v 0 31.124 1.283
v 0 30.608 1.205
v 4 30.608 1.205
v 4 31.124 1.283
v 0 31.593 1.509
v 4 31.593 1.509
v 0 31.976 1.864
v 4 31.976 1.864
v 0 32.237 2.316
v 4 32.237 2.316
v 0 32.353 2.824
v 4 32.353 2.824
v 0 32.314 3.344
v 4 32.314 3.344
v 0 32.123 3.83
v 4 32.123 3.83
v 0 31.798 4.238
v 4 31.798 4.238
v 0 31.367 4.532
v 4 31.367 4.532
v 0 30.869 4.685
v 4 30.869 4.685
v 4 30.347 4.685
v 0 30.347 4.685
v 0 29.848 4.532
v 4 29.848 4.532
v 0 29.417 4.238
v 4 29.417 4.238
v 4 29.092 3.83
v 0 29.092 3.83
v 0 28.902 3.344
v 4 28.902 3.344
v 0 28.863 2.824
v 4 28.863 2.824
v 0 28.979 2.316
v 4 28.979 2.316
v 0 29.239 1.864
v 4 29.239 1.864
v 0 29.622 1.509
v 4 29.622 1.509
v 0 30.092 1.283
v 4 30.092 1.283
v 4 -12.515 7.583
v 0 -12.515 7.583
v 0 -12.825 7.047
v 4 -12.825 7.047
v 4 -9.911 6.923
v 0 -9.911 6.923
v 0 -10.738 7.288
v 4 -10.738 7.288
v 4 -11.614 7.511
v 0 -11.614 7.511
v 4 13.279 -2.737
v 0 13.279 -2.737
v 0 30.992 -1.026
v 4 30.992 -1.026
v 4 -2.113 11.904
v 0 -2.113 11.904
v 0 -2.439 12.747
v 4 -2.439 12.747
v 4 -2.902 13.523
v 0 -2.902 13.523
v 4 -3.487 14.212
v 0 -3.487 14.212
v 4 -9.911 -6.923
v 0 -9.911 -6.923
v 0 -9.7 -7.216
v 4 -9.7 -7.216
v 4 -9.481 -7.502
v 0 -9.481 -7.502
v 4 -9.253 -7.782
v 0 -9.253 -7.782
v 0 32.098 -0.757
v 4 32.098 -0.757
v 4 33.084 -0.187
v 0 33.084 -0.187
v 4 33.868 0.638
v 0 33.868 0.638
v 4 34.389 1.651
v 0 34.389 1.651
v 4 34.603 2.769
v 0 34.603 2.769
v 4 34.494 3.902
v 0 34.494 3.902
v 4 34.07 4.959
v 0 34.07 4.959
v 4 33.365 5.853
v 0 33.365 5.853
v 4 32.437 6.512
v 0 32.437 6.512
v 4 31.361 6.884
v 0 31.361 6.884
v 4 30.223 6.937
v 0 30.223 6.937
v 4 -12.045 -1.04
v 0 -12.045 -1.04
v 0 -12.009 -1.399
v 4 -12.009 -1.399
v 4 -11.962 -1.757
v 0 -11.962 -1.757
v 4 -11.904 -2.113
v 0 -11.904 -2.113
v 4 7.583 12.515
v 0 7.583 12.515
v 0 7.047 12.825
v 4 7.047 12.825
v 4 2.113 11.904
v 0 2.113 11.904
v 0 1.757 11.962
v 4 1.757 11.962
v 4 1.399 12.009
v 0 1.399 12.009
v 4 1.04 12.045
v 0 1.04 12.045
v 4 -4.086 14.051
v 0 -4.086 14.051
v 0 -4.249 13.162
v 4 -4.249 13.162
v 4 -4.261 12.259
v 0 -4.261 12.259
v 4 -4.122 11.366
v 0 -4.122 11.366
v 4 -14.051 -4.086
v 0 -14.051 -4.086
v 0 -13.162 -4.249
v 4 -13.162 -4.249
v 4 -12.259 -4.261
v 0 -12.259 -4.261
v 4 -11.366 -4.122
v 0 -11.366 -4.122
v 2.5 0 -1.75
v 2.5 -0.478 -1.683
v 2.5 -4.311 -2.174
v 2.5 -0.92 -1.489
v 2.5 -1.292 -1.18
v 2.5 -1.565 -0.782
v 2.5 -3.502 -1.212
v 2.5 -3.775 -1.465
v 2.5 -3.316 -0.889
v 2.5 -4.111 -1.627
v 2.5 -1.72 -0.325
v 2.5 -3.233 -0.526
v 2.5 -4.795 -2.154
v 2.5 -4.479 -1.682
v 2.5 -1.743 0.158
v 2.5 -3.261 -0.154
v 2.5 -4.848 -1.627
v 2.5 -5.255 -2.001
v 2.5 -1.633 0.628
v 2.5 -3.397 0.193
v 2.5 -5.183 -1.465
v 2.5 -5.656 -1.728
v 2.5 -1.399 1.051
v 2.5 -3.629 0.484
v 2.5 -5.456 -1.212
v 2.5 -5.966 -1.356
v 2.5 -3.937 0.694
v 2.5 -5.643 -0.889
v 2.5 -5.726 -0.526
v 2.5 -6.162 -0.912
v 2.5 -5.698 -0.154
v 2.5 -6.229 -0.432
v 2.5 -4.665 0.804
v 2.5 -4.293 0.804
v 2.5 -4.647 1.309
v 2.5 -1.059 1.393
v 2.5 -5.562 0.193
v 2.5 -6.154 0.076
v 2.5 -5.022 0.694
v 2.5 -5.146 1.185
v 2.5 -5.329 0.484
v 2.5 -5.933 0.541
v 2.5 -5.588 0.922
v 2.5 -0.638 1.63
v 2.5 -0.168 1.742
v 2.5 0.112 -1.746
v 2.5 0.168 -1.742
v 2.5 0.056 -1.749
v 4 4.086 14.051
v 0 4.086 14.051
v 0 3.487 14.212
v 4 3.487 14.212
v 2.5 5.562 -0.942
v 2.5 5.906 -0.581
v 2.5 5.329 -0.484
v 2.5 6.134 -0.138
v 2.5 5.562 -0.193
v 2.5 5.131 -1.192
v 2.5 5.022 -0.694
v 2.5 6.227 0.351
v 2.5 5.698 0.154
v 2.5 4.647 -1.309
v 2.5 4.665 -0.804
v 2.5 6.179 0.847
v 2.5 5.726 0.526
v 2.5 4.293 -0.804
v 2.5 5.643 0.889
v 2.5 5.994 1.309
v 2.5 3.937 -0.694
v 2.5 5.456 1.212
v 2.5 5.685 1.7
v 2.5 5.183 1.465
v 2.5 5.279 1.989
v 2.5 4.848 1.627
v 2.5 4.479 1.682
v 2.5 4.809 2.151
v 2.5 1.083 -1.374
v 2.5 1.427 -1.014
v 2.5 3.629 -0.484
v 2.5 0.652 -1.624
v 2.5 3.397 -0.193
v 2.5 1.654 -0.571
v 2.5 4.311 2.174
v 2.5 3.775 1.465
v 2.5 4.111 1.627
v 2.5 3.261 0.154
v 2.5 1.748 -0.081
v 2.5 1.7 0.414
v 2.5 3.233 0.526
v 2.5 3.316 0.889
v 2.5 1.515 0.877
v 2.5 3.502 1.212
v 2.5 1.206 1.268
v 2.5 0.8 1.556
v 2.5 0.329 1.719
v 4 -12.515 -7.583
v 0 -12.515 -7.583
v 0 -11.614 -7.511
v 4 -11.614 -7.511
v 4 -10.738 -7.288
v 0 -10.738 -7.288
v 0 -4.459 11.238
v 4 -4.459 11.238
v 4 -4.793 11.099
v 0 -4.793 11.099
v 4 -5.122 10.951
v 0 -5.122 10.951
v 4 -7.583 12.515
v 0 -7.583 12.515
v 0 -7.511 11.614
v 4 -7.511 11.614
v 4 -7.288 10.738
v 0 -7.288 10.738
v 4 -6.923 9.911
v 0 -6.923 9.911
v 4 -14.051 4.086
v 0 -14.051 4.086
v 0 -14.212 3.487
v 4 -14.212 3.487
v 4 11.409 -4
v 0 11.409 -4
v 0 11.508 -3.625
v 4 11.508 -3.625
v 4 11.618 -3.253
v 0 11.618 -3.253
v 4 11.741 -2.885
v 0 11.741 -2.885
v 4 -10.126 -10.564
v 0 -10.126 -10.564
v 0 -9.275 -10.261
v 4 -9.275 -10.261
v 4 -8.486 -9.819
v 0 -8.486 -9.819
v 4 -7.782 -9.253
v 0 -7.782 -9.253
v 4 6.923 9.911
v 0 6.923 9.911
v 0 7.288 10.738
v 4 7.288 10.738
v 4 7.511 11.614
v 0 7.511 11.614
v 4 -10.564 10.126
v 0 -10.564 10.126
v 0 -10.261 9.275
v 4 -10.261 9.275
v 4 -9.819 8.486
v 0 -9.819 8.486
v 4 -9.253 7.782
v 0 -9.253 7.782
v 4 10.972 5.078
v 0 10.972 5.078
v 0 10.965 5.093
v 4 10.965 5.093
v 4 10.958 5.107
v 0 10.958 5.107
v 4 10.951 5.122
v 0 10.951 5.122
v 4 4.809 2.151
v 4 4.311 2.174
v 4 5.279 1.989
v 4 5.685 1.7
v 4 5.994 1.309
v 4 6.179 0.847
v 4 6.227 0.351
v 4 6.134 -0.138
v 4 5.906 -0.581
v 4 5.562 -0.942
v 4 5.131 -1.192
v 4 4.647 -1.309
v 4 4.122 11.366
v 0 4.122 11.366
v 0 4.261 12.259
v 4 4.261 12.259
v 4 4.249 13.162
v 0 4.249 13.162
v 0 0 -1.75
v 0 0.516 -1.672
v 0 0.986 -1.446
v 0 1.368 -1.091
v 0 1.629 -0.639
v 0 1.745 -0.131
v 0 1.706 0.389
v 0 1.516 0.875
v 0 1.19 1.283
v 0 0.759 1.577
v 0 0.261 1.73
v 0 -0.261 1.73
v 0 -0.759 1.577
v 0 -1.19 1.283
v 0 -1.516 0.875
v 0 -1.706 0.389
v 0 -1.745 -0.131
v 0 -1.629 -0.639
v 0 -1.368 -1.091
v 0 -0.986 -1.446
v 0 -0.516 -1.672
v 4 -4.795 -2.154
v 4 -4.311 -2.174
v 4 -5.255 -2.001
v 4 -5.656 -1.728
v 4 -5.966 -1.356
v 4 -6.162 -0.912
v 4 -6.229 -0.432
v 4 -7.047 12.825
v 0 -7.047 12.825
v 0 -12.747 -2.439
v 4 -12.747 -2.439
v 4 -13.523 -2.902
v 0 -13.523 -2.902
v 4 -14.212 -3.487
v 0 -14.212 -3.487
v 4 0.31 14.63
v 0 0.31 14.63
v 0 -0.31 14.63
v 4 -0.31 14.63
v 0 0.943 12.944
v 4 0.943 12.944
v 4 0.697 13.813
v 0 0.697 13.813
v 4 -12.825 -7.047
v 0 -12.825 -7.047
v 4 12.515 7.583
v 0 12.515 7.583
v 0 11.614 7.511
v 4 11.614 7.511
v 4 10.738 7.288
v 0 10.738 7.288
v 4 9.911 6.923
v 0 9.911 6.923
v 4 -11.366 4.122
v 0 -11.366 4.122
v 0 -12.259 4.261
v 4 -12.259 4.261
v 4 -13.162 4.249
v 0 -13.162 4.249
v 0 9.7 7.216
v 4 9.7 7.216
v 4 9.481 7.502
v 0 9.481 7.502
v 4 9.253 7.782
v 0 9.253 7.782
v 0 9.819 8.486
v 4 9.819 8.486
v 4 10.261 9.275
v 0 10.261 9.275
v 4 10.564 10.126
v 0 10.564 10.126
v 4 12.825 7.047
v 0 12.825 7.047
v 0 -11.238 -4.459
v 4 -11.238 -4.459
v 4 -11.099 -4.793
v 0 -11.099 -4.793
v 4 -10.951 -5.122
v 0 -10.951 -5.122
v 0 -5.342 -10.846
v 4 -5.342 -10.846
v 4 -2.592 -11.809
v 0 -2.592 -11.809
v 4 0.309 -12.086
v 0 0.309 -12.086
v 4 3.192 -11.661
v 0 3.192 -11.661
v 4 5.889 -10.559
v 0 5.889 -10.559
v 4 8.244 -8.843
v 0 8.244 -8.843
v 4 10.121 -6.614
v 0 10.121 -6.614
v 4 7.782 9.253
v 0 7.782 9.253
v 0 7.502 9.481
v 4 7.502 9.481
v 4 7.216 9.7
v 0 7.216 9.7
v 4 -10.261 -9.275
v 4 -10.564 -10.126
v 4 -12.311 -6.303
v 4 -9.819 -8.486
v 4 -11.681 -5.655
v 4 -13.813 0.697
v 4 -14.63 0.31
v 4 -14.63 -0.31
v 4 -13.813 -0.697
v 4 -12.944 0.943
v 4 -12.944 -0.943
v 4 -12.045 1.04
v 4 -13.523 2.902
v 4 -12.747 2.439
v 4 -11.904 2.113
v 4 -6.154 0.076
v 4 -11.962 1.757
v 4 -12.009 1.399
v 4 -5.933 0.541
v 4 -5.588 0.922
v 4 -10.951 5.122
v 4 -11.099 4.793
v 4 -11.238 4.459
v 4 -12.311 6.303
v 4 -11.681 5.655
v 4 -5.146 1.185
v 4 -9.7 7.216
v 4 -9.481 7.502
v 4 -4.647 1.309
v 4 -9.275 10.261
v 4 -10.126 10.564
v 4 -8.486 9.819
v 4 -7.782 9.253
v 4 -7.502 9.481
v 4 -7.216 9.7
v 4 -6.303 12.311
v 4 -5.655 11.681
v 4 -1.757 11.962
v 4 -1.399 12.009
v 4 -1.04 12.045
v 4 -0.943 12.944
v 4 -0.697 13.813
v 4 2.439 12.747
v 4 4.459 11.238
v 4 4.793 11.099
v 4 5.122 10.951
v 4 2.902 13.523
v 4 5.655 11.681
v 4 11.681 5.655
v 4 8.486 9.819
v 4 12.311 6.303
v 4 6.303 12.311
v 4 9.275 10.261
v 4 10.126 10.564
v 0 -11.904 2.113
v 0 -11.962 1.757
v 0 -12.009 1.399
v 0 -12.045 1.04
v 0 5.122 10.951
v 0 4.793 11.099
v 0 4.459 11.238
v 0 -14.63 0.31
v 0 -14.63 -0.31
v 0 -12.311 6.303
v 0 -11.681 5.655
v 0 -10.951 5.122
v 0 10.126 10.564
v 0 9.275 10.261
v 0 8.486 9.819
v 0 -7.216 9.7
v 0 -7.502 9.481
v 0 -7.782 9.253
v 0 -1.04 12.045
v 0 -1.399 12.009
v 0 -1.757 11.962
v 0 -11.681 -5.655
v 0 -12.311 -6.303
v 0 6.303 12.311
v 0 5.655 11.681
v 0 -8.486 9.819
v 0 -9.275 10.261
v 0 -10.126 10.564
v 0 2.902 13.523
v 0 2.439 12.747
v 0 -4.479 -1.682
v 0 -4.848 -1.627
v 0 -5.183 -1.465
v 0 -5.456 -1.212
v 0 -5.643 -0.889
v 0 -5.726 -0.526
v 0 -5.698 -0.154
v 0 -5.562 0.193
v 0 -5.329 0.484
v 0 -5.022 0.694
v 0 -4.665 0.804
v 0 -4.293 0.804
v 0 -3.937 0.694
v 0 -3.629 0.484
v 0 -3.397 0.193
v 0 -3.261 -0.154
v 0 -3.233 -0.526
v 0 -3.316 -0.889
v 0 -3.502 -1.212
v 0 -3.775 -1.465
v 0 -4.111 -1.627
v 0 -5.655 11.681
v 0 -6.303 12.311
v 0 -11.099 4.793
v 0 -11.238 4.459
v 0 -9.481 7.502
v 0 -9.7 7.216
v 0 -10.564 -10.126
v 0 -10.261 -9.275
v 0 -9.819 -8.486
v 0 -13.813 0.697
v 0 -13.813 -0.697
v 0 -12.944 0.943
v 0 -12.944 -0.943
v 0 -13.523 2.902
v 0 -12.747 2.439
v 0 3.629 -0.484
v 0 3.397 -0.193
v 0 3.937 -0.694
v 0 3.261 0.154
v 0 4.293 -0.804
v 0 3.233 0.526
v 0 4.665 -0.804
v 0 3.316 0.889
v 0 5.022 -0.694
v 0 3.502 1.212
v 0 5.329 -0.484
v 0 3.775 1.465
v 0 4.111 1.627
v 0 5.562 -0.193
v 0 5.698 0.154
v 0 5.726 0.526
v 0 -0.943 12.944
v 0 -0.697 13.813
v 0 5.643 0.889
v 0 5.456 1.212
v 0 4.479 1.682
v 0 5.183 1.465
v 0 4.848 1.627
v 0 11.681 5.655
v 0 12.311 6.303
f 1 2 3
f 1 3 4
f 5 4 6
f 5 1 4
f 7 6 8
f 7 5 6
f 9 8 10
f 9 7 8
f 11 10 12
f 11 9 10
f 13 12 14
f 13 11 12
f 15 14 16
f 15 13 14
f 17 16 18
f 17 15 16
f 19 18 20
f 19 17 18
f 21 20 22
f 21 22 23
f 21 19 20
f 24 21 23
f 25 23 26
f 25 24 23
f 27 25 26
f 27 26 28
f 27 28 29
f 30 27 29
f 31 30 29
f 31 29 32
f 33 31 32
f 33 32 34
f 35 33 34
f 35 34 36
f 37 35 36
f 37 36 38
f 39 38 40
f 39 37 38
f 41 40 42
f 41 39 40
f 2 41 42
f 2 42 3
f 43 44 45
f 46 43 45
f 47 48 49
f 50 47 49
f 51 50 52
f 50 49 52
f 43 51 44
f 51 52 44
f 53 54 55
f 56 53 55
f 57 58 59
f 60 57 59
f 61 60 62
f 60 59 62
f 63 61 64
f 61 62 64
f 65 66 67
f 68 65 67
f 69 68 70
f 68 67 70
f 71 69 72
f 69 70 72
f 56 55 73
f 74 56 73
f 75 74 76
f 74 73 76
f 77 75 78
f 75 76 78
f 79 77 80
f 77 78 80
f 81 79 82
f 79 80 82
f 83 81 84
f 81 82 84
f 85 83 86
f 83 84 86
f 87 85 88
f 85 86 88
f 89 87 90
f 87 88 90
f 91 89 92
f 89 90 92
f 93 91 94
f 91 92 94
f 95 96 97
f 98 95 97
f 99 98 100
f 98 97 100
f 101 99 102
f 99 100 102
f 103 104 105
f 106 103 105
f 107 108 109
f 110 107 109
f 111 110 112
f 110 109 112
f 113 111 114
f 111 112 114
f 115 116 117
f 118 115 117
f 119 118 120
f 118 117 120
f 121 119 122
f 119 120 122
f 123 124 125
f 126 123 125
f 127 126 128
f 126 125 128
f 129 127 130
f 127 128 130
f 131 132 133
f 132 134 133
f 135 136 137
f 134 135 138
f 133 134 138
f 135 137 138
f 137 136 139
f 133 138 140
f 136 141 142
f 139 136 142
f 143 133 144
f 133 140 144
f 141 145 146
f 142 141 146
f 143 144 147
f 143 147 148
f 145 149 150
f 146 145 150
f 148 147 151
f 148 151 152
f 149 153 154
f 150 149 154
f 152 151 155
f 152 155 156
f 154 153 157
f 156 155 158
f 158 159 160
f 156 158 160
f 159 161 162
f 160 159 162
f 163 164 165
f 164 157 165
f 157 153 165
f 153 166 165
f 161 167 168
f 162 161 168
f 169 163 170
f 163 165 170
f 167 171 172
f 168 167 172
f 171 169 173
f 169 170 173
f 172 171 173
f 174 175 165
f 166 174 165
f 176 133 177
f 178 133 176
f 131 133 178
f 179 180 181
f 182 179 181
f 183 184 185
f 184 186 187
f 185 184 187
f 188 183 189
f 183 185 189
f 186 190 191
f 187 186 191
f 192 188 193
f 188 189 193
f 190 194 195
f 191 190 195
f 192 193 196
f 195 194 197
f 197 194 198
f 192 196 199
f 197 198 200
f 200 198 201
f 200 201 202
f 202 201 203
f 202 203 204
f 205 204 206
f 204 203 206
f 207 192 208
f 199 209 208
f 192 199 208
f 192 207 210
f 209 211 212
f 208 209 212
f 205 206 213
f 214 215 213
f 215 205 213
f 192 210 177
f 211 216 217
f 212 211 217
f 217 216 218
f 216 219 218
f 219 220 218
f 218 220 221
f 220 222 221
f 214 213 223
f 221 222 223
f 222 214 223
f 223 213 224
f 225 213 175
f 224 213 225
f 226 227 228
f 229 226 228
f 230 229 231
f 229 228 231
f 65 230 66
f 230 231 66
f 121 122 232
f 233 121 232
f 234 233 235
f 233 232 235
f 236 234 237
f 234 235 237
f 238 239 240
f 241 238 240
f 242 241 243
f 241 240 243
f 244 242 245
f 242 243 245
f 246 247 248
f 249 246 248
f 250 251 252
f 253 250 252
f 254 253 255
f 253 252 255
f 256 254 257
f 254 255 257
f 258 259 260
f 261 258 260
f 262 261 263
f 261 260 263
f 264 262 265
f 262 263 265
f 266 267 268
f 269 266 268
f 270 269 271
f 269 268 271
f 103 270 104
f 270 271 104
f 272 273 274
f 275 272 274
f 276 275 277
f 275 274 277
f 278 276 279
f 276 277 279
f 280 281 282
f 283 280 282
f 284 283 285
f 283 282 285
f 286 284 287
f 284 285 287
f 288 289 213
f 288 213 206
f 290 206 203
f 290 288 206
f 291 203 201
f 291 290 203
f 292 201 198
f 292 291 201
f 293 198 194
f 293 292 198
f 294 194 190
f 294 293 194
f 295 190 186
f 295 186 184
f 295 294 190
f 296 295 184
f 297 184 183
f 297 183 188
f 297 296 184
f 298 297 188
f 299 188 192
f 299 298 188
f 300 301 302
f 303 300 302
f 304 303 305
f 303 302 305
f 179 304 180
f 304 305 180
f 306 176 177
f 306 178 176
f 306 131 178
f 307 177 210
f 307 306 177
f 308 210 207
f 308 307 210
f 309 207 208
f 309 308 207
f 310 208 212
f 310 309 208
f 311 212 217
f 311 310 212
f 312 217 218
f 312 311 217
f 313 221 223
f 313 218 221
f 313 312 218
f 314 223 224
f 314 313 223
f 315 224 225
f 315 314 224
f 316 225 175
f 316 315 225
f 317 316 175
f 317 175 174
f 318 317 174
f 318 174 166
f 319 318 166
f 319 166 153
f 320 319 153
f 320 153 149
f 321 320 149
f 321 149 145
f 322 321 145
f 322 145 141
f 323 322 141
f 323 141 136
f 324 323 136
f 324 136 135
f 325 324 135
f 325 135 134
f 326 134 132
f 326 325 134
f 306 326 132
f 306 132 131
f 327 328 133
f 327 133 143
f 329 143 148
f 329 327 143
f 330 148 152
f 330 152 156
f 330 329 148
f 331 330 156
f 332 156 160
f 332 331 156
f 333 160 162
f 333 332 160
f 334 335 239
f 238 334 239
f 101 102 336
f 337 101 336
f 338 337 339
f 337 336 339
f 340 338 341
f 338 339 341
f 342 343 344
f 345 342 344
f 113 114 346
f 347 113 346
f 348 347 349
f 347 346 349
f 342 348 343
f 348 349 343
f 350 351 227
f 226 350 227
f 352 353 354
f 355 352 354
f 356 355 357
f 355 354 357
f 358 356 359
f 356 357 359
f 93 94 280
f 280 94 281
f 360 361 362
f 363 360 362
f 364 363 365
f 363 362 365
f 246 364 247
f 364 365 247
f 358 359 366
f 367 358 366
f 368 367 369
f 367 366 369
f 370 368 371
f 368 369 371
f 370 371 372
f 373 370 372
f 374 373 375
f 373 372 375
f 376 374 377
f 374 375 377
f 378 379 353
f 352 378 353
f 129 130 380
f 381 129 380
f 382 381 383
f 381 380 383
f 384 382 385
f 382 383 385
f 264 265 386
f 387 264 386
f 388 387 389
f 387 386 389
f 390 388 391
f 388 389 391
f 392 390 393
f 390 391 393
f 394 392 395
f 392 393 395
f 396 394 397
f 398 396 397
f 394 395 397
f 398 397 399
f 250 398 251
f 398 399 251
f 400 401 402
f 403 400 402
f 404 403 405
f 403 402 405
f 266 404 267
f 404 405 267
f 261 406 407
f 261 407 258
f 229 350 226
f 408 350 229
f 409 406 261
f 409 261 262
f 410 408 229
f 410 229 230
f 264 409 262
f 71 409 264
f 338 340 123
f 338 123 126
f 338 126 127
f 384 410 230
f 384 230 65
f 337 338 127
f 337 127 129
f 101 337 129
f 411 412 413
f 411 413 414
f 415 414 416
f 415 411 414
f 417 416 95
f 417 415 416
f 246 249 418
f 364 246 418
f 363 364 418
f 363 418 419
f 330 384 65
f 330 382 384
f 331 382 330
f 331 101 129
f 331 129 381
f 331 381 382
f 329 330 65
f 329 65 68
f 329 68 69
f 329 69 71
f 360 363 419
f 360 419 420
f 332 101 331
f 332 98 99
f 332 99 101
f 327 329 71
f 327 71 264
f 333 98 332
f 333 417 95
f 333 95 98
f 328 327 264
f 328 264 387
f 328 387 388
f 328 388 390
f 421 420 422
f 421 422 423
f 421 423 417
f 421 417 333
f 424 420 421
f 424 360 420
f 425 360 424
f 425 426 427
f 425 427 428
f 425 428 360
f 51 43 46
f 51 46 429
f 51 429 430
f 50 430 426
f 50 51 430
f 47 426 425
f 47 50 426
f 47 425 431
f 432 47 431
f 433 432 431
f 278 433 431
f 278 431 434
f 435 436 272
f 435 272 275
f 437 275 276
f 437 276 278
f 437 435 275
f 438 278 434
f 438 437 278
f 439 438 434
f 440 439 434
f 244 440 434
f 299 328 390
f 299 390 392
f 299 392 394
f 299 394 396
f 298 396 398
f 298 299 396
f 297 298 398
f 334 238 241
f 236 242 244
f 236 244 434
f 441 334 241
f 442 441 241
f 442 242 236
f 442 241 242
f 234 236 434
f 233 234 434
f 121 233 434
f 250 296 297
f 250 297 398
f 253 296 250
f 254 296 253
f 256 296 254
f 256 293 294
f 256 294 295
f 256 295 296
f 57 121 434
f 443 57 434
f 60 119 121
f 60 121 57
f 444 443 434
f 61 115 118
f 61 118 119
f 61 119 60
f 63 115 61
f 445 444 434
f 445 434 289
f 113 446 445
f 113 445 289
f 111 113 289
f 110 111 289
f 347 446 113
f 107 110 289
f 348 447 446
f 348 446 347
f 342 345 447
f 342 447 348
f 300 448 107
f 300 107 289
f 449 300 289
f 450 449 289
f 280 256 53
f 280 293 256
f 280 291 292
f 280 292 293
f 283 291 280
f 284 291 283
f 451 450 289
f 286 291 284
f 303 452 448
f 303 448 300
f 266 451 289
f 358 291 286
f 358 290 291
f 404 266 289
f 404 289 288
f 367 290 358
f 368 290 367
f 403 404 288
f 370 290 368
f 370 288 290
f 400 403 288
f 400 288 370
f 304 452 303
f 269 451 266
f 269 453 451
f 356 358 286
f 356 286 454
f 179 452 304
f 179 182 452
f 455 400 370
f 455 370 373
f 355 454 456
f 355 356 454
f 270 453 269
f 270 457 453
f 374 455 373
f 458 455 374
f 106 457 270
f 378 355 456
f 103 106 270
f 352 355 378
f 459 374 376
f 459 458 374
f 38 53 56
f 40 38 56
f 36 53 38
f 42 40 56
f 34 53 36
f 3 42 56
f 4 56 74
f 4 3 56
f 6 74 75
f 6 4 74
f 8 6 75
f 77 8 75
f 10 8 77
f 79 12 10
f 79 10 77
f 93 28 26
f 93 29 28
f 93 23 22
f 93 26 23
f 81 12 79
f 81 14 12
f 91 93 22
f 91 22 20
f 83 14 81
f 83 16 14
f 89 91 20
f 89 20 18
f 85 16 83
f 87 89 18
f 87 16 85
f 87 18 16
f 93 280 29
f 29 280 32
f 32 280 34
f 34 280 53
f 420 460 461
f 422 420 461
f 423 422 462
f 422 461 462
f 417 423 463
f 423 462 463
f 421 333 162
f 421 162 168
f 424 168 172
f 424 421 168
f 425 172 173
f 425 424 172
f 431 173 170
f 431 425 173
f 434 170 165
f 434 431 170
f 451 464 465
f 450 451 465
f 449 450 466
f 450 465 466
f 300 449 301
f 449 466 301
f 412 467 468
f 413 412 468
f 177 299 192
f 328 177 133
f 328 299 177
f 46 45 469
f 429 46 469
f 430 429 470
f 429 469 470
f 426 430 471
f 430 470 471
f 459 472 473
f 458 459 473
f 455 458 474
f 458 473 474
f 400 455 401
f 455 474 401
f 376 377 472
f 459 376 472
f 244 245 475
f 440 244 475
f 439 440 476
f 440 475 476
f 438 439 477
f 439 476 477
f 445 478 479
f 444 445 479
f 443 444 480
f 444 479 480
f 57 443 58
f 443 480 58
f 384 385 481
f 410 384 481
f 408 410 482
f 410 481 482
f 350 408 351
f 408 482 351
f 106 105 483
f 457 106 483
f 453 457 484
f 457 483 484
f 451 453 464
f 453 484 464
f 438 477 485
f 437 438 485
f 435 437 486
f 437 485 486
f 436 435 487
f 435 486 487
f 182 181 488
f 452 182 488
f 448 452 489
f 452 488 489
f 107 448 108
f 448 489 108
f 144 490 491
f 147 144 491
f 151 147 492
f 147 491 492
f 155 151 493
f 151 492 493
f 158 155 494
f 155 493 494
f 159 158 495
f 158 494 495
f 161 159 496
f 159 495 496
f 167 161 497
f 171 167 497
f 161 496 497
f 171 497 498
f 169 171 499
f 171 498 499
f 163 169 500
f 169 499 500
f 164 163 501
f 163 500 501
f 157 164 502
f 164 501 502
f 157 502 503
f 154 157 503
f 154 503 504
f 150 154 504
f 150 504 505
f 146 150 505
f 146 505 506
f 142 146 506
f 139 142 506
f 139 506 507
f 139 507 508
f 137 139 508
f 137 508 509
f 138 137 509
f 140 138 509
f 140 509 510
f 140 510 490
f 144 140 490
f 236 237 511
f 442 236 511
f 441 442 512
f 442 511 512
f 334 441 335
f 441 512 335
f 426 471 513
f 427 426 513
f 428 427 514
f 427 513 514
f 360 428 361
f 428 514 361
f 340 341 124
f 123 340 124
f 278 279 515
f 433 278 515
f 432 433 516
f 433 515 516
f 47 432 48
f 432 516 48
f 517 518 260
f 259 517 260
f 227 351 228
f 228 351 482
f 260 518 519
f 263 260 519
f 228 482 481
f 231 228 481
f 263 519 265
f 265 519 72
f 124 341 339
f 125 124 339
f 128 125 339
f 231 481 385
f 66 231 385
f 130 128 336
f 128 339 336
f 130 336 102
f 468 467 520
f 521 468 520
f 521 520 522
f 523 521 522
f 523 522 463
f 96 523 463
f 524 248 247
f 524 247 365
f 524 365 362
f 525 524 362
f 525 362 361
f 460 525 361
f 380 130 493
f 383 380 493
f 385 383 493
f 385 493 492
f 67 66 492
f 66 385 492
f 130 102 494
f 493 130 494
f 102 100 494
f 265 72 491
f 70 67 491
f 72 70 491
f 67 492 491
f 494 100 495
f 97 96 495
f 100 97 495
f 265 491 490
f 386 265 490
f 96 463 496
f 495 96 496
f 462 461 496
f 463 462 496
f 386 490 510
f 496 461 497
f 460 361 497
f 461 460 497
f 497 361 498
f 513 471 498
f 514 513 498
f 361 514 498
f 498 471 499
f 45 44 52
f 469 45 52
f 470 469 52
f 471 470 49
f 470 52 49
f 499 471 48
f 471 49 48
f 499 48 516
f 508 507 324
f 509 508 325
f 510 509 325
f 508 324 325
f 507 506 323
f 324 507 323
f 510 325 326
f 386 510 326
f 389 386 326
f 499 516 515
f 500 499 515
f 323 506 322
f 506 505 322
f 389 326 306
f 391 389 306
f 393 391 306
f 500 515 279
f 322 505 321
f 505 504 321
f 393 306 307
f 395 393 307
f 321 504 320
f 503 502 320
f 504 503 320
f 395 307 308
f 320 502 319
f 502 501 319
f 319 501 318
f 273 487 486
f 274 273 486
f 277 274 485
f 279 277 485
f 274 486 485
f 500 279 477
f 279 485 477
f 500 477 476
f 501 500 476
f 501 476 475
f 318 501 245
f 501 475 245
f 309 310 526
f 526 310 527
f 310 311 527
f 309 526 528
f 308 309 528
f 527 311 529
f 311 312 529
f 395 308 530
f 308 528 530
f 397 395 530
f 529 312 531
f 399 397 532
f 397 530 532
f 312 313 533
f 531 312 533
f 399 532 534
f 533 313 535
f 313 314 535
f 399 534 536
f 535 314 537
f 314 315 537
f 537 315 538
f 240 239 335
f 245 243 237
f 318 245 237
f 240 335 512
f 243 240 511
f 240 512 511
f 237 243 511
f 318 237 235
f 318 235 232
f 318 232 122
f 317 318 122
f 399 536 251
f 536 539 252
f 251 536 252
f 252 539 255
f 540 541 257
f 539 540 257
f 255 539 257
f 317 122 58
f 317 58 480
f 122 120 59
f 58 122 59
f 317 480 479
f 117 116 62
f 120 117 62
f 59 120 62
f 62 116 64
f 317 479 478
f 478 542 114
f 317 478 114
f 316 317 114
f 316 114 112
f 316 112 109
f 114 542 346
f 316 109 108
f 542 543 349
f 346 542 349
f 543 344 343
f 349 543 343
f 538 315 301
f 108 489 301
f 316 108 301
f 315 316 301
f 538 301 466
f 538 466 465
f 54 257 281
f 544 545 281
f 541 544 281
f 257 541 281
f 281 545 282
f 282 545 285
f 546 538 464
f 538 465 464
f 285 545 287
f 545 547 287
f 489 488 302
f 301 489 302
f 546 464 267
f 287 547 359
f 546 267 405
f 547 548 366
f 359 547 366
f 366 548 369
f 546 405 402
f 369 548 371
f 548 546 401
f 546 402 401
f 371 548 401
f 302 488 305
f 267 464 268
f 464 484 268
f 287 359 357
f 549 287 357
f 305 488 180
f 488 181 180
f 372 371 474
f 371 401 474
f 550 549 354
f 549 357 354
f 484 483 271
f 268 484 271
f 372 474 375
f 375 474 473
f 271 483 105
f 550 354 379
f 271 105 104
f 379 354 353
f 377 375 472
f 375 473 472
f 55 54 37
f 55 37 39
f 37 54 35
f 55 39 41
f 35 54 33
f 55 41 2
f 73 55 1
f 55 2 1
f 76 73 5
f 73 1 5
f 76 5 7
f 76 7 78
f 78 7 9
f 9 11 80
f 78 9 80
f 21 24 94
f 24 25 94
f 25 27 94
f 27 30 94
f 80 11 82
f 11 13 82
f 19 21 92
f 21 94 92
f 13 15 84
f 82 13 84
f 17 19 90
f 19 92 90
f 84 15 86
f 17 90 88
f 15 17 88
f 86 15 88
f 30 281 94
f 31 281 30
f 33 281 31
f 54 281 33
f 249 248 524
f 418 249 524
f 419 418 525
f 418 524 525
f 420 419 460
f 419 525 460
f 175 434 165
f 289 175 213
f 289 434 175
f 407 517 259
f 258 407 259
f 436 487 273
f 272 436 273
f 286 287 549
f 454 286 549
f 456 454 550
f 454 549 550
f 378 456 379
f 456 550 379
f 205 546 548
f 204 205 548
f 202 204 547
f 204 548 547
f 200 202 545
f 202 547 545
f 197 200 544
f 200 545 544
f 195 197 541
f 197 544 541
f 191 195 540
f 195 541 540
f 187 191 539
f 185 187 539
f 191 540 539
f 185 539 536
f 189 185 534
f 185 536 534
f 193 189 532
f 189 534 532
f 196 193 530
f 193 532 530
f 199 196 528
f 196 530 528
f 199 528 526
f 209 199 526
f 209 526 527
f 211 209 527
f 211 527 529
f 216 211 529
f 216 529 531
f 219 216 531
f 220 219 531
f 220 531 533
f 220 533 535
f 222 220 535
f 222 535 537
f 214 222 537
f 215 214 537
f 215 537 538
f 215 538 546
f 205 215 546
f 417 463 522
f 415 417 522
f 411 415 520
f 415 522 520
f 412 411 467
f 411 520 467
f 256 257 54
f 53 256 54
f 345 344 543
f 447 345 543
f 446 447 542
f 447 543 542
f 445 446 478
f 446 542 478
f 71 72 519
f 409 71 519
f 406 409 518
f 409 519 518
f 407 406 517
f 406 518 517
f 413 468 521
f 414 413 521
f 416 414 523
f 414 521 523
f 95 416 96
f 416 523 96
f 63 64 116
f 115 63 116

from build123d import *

# Parameters (mm, degrees)
SKETCH1_R           = 1.75
BOSS_EXTRUDE1_DEPTH = 4
SKETCH3_R           = 1.25
CUT_EXTRUDE1_DEPTH  = 38.785297658
CUT_EXTRUDE2_START  = -4
CUT_EXTRUDE2_DEPTH  = 1.5


with BuildPart() as part:
    # Sketch1 → Boss-Extrude1 (new body)
    with BuildSketch(Plane.YZ):
        with BuildLine():
            Line((0.31, 14.63), (-0.31, 14.63))
            ThreePointArc((-0.31, 14.63), (-0.838273314, 13.383704325), (-1.04, 12.04518576))
            ThreePointArc((-1.04, 12.04518576), (-1.578061664, 11.986568374), (-2.112960617, 11.903927815))
            ThreePointArc((-2.112960617, 11.903927815), (-2.65424773, 13.144626757), (-3.487085624, 14.211728743))
            Line((-3.487085624, 14.211728743), (-4.085959636, 14.051260935))
            ThreePointArc((-4.085959636, 14.051260935), (-4.273667417, 12.71070456), (-4.122086336, 11.365584201))
            ThreePointArc((-4.122086336, 11.365584201), (-4.626642697, 11.169703548), (-5.12192646, 10.951436862))
            ThreePointArc((-5.12192646, 10.951436862), (-5.965886177, 12.009764599), (-7.046532125, 12.824951657))
            Line((-7.046532125, 12.824951657), (-7.583467875, 12.514951657))
            ThreePointArc((-7.583467875, 12.514951657), (-7.417818147, 11.171491285), (-6.9232593, 9.911436862))
            ThreePointArc((-6.9232593, 9.911436862), (-7.359925677, 9.591641884), (-7.781841479, 9.252623584))
            ThreePointArc((-7.781841479, 9.252623584), (-8.870959341, 10.05645683), (-10.125769107, 10.564175311))
            Line((-10.125769107, 10.564175311), (-10.564175311, 10.125769107))
            ThreePointArc((-10.564175311, 10.125769107), (-10.05645683, 8.870959341), (-9.252623584, 7.781841479))
            ThreePointArc((-9.252623584, 7.781841479), (-9.591641884, 7.359925677), (-9.911436862, 6.9232593))
            ThreePointArc((-9.911436862, 6.9232593), (-11.171491285, 7.417818147), (-12.514951657, 7.583467875))
            Line((-12.514951657, 7.583467875), (-12.824951657, 7.046532125))
            ThreePointArc((-12.824951657, 7.046532125), (-12.009764599, 5.965886177), (-10.951436862, 5.12192646))
            ThreePointArc((-10.951436862, 5.12192646), (-11.169703548, 4.626642697), (-11.365584201, 4.122086336))
            ThreePointArc((-11.365584201, 4.122086336), (-12.71070456, 4.273667417), (-14.051260935, 4.085959636))
            Line((-14.051260935, 4.085959636), (-14.211728743, 3.487085624))
            ThreePointArc((-14.211728743, 3.487085624), (-13.144626757, 2.65424773), (-11.903927815, 2.112960617))
            ThreePointArc((-11.903927815, 2.112960617), (-11.986568374, 1.578061664), (-12.04518576, 1.04))
            ThreePointArc((-12.04518576, 1.04), (-13.383704325, 0.838273314), (-14.63, 0.31))
            Line((-14.63, 0.31), (-14.63, -0.31))
            ThreePointArc((-14.63, -0.31), (-13.383704325, -0.838273314), (-12.04518576, -1.04))
            ThreePointArc((-12.04518576, -1.04), (-11.986568374, -1.578061664), (-11.903927815, -2.112960617))
            ThreePointArc((-11.903927815, -2.112960617), (-13.144626757, -2.65424773), (-14.211728743, -3.487085624))
            Line((-14.211728743, -3.487085624), (-14.051260935, -4.085959636))
            ThreePointArc((-14.051260935, -4.085959636), (-12.71070456, -4.273667417), (-11.365584201, -4.122086336))
            ThreePointArc((-11.365584201, -4.122086336), (-11.169703548, -4.626642697), (-10.951436862, -5.12192646))
            ThreePointArc((-10.951436862, -5.12192646), (-12.009764599, -5.965886177), (-12.824951657, -7.046532125))
            Line((-12.824951657, -7.046532125), (-12.514951657, -7.583467875))
            ThreePointArc((-12.514951657, -7.583467875), (-11.171491285, -7.417818147), (-9.911436862, -6.9232593))
            ThreePointArc((-9.911436862, -6.9232593), (-9.591641884, -7.359925677), (-9.252623584, -7.781841479))
            ThreePointArc((-9.252623584, -7.781841479), (-10.05645683, -8.870959341), (-10.564175311, -10.125769107))
            Line((-10.564175311, -10.125769107), (-10.125769107, -10.564175311))
            ThreePointArc((-10.125769107, -10.564175311), (-8.870959341, -10.05645683), (-7.781841479, -9.252623584))
            ThreePointArc((-7.781841479, -9.252623584), (3.191677838, -11.661101688), (11.409123542, -4))
            ThreePointArc((11.409123542, -4), (11.561502637, -3.438555035), (11.740713538, -2.885090229))
            Line((11.740713538, -2.885090229), (13.278503475, -2.736624135))
            Line((13.278503475, -2.736624135), (30.992077522, -1.026465229))
            ThreePointArc((30.992077522, -1.026465229), (34.589171795, 3.3394153), (30.223291266, 6.936509573))
            Line((30.223291266, 6.936509573), (10.971927281, 5.077884573))
            ThreePointArc((10.971927281, 5.077884573), (10.96170419, 5.099915807), (10.951436862, 5.12192646))
            ThreePointArc((10.951436862, 5.12192646), (12.009764599, 5.965886177), (12.824951657, 7.046532125))
            Line((12.824951657, 7.046532125), (12.514951657, 7.583467875))
            ThreePointArc((12.514951657, 7.583467875), (11.171491285, 7.417818147), (9.911436862, 6.9232593))
            ThreePointArc((9.911436862, 6.9232593), (9.591641884, 7.359925677), (9.252623584, 7.781841479))
            ThreePointArc((9.252623584, 7.781841479), (10.05645683, 8.870959341), (10.564175311, 10.125769107))
            Line((10.564175311, 10.125769107), (10.125769107, 10.564175311))
            ThreePointArc((10.125769107, 10.564175311), (8.870959341, 10.05645683), (7.781841479, 9.252623584))
            ThreePointArc((7.781841479, 9.252623584), (7.359925677, 9.591641884), (6.9232593, 9.911436862))
            ThreePointArc((6.9232593, 9.911436862), (7.417818147, 11.171491285), (7.583467875, 12.514951657))
            Line((7.583467875, 12.514951657), (7.046532125, 12.824951657))
            ThreePointArc((7.046532125, 12.824951657), (5.965886177, 12.009764599), (5.12192646, 10.951436862))
            ThreePointArc((5.12192646, 10.951436862), (4.626642697, 11.169703548), (4.122086336, 11.365584201))
            ThreePointArc((4.122086336, 11.365584201), (4.273667417, 12.71070456), (4.085959636, 14.051260935))
            Line((4.085959636, 14.051260935), (3.487085624, 14.211728743))
            ThreePointArc((3.487085624, 14.211728743), (2.65424773, 13.144626757), (2.112960617, 11.903927815))
            ThreePointArc((2.112960617, 11.903927815), (1.578061664, 11.986568374), (1.04, 12.04518576))
            ThreePointArc((1.04, 12.04518576), (0.838273314, 13.383704325), (0.31, 14.63))
        make_face()
        with Locations(Location((0, 0, 0), (0, 0, 270))):
            Circle(SKETCH1_R, mode=Mode.SUBTRACT)
        with Locations(Location((30.607684394, 2.955022172, 0), (0, 0, 270))):
            Circle(SKETCH1_R, mode=Mode.SUBTRACT)
    extrude(amount=BOSS_EXTRUDE1_DEPTH)

    # Sketch3 → Cut-Extrude1 (cut, through all)
    with BuildSketch(Plane(origin=(0, 0, 0), x_dir=(0, -1, 0), z_dir=(-1, 0, 0))):
        with Locations(Location((-4.479173326, 0.432442269, 0), (0, 0, 90))):
            Circle(SKETCH3_R)
        with Locations(Location((4.479173326, -0.432442269, 0), (0, 0, 270))):
            Circle(SKETCH3_R)
    extrude(amount=-CUT_EXTRUDE1_DEPTH, mode=Mode.SUBTRACT)

    # Sketch4 → Cut-Extrude2 (cut)
    with BuildSketch(Plane(origin=(0, 0, 0), x_dir=(0, -1, 0), z_dir=(-1, 0, 0)).offset(CUT_EXTRUDE2_START)):
        with BuildLine():
            ThreePointArc((6.229173326, -0.432442269), (5.774704296, 0.744035315), (4.647345319, 1.309458469))
            Line((4.647345319, 1.309458469), (4.311001332, -2.174343007))
            ThreePointArc((4.311001332, -2.174343007), (5.65565091, -1.727973239), (6.229173326, -0.432442269))
        make_face()
        with BuildLine():
            Line((4.311001332, -2.174343007), (4.647345319, 1.309458469))
            ThreePointArc((4.647345319, 1.309458469), (2.737272588, -0.264270276), (4.311001332, -2.174343007))
        make_face()
        with BuildLine():
            ThreePointArc((-2.729173326, 0.432442269), (-3.183642356, 1.608919853), (-4.311001332, 2.174343007))
            Line((-4.311001332, 2.174343007), (-4.647345319, -1.309458469))
            ThreePointArc((-4.647345319, -1.309458469), (-3.302695742, -0.863088701), (-2.729173326, 0.432442269))
        make_face()
        with BuildLine():
            Line((-4.647345319, -1.309458469), (-4.311001332, 2.174343007))
            ThreePointArc((-4.311001332, 2.174343007), (-6.221074064, 0.600614263), (-4.647345319, -1.309458469))
        make_face()
        with BuildLine():
            ThreePointArc((4.311001332, -2.174343007), (2.737272588, -0.264270276), (4.647345319, 1.309458469))
            Line((4.647345319, 1.309458469), (-4.311001332, 2.174343007))
            ThreePointArc((-4.311001332, 2.174343007), (-3.183642356, 1.608919853), (-2.729173326, 0.432442269))
            ThreePointArc((-2.729173326, 0.432442269), (-3.302695742, -0.863088701), (-4.647345319, -1.309458469))
            Line((-4.647345319, -1.309458469), (4.311001332, -2.174343007))
        make_face()
    extrude(amount=CUT_EXTRUDE2_DEPTH, mode=Mode.SUBTRACT)


solid = part.part
